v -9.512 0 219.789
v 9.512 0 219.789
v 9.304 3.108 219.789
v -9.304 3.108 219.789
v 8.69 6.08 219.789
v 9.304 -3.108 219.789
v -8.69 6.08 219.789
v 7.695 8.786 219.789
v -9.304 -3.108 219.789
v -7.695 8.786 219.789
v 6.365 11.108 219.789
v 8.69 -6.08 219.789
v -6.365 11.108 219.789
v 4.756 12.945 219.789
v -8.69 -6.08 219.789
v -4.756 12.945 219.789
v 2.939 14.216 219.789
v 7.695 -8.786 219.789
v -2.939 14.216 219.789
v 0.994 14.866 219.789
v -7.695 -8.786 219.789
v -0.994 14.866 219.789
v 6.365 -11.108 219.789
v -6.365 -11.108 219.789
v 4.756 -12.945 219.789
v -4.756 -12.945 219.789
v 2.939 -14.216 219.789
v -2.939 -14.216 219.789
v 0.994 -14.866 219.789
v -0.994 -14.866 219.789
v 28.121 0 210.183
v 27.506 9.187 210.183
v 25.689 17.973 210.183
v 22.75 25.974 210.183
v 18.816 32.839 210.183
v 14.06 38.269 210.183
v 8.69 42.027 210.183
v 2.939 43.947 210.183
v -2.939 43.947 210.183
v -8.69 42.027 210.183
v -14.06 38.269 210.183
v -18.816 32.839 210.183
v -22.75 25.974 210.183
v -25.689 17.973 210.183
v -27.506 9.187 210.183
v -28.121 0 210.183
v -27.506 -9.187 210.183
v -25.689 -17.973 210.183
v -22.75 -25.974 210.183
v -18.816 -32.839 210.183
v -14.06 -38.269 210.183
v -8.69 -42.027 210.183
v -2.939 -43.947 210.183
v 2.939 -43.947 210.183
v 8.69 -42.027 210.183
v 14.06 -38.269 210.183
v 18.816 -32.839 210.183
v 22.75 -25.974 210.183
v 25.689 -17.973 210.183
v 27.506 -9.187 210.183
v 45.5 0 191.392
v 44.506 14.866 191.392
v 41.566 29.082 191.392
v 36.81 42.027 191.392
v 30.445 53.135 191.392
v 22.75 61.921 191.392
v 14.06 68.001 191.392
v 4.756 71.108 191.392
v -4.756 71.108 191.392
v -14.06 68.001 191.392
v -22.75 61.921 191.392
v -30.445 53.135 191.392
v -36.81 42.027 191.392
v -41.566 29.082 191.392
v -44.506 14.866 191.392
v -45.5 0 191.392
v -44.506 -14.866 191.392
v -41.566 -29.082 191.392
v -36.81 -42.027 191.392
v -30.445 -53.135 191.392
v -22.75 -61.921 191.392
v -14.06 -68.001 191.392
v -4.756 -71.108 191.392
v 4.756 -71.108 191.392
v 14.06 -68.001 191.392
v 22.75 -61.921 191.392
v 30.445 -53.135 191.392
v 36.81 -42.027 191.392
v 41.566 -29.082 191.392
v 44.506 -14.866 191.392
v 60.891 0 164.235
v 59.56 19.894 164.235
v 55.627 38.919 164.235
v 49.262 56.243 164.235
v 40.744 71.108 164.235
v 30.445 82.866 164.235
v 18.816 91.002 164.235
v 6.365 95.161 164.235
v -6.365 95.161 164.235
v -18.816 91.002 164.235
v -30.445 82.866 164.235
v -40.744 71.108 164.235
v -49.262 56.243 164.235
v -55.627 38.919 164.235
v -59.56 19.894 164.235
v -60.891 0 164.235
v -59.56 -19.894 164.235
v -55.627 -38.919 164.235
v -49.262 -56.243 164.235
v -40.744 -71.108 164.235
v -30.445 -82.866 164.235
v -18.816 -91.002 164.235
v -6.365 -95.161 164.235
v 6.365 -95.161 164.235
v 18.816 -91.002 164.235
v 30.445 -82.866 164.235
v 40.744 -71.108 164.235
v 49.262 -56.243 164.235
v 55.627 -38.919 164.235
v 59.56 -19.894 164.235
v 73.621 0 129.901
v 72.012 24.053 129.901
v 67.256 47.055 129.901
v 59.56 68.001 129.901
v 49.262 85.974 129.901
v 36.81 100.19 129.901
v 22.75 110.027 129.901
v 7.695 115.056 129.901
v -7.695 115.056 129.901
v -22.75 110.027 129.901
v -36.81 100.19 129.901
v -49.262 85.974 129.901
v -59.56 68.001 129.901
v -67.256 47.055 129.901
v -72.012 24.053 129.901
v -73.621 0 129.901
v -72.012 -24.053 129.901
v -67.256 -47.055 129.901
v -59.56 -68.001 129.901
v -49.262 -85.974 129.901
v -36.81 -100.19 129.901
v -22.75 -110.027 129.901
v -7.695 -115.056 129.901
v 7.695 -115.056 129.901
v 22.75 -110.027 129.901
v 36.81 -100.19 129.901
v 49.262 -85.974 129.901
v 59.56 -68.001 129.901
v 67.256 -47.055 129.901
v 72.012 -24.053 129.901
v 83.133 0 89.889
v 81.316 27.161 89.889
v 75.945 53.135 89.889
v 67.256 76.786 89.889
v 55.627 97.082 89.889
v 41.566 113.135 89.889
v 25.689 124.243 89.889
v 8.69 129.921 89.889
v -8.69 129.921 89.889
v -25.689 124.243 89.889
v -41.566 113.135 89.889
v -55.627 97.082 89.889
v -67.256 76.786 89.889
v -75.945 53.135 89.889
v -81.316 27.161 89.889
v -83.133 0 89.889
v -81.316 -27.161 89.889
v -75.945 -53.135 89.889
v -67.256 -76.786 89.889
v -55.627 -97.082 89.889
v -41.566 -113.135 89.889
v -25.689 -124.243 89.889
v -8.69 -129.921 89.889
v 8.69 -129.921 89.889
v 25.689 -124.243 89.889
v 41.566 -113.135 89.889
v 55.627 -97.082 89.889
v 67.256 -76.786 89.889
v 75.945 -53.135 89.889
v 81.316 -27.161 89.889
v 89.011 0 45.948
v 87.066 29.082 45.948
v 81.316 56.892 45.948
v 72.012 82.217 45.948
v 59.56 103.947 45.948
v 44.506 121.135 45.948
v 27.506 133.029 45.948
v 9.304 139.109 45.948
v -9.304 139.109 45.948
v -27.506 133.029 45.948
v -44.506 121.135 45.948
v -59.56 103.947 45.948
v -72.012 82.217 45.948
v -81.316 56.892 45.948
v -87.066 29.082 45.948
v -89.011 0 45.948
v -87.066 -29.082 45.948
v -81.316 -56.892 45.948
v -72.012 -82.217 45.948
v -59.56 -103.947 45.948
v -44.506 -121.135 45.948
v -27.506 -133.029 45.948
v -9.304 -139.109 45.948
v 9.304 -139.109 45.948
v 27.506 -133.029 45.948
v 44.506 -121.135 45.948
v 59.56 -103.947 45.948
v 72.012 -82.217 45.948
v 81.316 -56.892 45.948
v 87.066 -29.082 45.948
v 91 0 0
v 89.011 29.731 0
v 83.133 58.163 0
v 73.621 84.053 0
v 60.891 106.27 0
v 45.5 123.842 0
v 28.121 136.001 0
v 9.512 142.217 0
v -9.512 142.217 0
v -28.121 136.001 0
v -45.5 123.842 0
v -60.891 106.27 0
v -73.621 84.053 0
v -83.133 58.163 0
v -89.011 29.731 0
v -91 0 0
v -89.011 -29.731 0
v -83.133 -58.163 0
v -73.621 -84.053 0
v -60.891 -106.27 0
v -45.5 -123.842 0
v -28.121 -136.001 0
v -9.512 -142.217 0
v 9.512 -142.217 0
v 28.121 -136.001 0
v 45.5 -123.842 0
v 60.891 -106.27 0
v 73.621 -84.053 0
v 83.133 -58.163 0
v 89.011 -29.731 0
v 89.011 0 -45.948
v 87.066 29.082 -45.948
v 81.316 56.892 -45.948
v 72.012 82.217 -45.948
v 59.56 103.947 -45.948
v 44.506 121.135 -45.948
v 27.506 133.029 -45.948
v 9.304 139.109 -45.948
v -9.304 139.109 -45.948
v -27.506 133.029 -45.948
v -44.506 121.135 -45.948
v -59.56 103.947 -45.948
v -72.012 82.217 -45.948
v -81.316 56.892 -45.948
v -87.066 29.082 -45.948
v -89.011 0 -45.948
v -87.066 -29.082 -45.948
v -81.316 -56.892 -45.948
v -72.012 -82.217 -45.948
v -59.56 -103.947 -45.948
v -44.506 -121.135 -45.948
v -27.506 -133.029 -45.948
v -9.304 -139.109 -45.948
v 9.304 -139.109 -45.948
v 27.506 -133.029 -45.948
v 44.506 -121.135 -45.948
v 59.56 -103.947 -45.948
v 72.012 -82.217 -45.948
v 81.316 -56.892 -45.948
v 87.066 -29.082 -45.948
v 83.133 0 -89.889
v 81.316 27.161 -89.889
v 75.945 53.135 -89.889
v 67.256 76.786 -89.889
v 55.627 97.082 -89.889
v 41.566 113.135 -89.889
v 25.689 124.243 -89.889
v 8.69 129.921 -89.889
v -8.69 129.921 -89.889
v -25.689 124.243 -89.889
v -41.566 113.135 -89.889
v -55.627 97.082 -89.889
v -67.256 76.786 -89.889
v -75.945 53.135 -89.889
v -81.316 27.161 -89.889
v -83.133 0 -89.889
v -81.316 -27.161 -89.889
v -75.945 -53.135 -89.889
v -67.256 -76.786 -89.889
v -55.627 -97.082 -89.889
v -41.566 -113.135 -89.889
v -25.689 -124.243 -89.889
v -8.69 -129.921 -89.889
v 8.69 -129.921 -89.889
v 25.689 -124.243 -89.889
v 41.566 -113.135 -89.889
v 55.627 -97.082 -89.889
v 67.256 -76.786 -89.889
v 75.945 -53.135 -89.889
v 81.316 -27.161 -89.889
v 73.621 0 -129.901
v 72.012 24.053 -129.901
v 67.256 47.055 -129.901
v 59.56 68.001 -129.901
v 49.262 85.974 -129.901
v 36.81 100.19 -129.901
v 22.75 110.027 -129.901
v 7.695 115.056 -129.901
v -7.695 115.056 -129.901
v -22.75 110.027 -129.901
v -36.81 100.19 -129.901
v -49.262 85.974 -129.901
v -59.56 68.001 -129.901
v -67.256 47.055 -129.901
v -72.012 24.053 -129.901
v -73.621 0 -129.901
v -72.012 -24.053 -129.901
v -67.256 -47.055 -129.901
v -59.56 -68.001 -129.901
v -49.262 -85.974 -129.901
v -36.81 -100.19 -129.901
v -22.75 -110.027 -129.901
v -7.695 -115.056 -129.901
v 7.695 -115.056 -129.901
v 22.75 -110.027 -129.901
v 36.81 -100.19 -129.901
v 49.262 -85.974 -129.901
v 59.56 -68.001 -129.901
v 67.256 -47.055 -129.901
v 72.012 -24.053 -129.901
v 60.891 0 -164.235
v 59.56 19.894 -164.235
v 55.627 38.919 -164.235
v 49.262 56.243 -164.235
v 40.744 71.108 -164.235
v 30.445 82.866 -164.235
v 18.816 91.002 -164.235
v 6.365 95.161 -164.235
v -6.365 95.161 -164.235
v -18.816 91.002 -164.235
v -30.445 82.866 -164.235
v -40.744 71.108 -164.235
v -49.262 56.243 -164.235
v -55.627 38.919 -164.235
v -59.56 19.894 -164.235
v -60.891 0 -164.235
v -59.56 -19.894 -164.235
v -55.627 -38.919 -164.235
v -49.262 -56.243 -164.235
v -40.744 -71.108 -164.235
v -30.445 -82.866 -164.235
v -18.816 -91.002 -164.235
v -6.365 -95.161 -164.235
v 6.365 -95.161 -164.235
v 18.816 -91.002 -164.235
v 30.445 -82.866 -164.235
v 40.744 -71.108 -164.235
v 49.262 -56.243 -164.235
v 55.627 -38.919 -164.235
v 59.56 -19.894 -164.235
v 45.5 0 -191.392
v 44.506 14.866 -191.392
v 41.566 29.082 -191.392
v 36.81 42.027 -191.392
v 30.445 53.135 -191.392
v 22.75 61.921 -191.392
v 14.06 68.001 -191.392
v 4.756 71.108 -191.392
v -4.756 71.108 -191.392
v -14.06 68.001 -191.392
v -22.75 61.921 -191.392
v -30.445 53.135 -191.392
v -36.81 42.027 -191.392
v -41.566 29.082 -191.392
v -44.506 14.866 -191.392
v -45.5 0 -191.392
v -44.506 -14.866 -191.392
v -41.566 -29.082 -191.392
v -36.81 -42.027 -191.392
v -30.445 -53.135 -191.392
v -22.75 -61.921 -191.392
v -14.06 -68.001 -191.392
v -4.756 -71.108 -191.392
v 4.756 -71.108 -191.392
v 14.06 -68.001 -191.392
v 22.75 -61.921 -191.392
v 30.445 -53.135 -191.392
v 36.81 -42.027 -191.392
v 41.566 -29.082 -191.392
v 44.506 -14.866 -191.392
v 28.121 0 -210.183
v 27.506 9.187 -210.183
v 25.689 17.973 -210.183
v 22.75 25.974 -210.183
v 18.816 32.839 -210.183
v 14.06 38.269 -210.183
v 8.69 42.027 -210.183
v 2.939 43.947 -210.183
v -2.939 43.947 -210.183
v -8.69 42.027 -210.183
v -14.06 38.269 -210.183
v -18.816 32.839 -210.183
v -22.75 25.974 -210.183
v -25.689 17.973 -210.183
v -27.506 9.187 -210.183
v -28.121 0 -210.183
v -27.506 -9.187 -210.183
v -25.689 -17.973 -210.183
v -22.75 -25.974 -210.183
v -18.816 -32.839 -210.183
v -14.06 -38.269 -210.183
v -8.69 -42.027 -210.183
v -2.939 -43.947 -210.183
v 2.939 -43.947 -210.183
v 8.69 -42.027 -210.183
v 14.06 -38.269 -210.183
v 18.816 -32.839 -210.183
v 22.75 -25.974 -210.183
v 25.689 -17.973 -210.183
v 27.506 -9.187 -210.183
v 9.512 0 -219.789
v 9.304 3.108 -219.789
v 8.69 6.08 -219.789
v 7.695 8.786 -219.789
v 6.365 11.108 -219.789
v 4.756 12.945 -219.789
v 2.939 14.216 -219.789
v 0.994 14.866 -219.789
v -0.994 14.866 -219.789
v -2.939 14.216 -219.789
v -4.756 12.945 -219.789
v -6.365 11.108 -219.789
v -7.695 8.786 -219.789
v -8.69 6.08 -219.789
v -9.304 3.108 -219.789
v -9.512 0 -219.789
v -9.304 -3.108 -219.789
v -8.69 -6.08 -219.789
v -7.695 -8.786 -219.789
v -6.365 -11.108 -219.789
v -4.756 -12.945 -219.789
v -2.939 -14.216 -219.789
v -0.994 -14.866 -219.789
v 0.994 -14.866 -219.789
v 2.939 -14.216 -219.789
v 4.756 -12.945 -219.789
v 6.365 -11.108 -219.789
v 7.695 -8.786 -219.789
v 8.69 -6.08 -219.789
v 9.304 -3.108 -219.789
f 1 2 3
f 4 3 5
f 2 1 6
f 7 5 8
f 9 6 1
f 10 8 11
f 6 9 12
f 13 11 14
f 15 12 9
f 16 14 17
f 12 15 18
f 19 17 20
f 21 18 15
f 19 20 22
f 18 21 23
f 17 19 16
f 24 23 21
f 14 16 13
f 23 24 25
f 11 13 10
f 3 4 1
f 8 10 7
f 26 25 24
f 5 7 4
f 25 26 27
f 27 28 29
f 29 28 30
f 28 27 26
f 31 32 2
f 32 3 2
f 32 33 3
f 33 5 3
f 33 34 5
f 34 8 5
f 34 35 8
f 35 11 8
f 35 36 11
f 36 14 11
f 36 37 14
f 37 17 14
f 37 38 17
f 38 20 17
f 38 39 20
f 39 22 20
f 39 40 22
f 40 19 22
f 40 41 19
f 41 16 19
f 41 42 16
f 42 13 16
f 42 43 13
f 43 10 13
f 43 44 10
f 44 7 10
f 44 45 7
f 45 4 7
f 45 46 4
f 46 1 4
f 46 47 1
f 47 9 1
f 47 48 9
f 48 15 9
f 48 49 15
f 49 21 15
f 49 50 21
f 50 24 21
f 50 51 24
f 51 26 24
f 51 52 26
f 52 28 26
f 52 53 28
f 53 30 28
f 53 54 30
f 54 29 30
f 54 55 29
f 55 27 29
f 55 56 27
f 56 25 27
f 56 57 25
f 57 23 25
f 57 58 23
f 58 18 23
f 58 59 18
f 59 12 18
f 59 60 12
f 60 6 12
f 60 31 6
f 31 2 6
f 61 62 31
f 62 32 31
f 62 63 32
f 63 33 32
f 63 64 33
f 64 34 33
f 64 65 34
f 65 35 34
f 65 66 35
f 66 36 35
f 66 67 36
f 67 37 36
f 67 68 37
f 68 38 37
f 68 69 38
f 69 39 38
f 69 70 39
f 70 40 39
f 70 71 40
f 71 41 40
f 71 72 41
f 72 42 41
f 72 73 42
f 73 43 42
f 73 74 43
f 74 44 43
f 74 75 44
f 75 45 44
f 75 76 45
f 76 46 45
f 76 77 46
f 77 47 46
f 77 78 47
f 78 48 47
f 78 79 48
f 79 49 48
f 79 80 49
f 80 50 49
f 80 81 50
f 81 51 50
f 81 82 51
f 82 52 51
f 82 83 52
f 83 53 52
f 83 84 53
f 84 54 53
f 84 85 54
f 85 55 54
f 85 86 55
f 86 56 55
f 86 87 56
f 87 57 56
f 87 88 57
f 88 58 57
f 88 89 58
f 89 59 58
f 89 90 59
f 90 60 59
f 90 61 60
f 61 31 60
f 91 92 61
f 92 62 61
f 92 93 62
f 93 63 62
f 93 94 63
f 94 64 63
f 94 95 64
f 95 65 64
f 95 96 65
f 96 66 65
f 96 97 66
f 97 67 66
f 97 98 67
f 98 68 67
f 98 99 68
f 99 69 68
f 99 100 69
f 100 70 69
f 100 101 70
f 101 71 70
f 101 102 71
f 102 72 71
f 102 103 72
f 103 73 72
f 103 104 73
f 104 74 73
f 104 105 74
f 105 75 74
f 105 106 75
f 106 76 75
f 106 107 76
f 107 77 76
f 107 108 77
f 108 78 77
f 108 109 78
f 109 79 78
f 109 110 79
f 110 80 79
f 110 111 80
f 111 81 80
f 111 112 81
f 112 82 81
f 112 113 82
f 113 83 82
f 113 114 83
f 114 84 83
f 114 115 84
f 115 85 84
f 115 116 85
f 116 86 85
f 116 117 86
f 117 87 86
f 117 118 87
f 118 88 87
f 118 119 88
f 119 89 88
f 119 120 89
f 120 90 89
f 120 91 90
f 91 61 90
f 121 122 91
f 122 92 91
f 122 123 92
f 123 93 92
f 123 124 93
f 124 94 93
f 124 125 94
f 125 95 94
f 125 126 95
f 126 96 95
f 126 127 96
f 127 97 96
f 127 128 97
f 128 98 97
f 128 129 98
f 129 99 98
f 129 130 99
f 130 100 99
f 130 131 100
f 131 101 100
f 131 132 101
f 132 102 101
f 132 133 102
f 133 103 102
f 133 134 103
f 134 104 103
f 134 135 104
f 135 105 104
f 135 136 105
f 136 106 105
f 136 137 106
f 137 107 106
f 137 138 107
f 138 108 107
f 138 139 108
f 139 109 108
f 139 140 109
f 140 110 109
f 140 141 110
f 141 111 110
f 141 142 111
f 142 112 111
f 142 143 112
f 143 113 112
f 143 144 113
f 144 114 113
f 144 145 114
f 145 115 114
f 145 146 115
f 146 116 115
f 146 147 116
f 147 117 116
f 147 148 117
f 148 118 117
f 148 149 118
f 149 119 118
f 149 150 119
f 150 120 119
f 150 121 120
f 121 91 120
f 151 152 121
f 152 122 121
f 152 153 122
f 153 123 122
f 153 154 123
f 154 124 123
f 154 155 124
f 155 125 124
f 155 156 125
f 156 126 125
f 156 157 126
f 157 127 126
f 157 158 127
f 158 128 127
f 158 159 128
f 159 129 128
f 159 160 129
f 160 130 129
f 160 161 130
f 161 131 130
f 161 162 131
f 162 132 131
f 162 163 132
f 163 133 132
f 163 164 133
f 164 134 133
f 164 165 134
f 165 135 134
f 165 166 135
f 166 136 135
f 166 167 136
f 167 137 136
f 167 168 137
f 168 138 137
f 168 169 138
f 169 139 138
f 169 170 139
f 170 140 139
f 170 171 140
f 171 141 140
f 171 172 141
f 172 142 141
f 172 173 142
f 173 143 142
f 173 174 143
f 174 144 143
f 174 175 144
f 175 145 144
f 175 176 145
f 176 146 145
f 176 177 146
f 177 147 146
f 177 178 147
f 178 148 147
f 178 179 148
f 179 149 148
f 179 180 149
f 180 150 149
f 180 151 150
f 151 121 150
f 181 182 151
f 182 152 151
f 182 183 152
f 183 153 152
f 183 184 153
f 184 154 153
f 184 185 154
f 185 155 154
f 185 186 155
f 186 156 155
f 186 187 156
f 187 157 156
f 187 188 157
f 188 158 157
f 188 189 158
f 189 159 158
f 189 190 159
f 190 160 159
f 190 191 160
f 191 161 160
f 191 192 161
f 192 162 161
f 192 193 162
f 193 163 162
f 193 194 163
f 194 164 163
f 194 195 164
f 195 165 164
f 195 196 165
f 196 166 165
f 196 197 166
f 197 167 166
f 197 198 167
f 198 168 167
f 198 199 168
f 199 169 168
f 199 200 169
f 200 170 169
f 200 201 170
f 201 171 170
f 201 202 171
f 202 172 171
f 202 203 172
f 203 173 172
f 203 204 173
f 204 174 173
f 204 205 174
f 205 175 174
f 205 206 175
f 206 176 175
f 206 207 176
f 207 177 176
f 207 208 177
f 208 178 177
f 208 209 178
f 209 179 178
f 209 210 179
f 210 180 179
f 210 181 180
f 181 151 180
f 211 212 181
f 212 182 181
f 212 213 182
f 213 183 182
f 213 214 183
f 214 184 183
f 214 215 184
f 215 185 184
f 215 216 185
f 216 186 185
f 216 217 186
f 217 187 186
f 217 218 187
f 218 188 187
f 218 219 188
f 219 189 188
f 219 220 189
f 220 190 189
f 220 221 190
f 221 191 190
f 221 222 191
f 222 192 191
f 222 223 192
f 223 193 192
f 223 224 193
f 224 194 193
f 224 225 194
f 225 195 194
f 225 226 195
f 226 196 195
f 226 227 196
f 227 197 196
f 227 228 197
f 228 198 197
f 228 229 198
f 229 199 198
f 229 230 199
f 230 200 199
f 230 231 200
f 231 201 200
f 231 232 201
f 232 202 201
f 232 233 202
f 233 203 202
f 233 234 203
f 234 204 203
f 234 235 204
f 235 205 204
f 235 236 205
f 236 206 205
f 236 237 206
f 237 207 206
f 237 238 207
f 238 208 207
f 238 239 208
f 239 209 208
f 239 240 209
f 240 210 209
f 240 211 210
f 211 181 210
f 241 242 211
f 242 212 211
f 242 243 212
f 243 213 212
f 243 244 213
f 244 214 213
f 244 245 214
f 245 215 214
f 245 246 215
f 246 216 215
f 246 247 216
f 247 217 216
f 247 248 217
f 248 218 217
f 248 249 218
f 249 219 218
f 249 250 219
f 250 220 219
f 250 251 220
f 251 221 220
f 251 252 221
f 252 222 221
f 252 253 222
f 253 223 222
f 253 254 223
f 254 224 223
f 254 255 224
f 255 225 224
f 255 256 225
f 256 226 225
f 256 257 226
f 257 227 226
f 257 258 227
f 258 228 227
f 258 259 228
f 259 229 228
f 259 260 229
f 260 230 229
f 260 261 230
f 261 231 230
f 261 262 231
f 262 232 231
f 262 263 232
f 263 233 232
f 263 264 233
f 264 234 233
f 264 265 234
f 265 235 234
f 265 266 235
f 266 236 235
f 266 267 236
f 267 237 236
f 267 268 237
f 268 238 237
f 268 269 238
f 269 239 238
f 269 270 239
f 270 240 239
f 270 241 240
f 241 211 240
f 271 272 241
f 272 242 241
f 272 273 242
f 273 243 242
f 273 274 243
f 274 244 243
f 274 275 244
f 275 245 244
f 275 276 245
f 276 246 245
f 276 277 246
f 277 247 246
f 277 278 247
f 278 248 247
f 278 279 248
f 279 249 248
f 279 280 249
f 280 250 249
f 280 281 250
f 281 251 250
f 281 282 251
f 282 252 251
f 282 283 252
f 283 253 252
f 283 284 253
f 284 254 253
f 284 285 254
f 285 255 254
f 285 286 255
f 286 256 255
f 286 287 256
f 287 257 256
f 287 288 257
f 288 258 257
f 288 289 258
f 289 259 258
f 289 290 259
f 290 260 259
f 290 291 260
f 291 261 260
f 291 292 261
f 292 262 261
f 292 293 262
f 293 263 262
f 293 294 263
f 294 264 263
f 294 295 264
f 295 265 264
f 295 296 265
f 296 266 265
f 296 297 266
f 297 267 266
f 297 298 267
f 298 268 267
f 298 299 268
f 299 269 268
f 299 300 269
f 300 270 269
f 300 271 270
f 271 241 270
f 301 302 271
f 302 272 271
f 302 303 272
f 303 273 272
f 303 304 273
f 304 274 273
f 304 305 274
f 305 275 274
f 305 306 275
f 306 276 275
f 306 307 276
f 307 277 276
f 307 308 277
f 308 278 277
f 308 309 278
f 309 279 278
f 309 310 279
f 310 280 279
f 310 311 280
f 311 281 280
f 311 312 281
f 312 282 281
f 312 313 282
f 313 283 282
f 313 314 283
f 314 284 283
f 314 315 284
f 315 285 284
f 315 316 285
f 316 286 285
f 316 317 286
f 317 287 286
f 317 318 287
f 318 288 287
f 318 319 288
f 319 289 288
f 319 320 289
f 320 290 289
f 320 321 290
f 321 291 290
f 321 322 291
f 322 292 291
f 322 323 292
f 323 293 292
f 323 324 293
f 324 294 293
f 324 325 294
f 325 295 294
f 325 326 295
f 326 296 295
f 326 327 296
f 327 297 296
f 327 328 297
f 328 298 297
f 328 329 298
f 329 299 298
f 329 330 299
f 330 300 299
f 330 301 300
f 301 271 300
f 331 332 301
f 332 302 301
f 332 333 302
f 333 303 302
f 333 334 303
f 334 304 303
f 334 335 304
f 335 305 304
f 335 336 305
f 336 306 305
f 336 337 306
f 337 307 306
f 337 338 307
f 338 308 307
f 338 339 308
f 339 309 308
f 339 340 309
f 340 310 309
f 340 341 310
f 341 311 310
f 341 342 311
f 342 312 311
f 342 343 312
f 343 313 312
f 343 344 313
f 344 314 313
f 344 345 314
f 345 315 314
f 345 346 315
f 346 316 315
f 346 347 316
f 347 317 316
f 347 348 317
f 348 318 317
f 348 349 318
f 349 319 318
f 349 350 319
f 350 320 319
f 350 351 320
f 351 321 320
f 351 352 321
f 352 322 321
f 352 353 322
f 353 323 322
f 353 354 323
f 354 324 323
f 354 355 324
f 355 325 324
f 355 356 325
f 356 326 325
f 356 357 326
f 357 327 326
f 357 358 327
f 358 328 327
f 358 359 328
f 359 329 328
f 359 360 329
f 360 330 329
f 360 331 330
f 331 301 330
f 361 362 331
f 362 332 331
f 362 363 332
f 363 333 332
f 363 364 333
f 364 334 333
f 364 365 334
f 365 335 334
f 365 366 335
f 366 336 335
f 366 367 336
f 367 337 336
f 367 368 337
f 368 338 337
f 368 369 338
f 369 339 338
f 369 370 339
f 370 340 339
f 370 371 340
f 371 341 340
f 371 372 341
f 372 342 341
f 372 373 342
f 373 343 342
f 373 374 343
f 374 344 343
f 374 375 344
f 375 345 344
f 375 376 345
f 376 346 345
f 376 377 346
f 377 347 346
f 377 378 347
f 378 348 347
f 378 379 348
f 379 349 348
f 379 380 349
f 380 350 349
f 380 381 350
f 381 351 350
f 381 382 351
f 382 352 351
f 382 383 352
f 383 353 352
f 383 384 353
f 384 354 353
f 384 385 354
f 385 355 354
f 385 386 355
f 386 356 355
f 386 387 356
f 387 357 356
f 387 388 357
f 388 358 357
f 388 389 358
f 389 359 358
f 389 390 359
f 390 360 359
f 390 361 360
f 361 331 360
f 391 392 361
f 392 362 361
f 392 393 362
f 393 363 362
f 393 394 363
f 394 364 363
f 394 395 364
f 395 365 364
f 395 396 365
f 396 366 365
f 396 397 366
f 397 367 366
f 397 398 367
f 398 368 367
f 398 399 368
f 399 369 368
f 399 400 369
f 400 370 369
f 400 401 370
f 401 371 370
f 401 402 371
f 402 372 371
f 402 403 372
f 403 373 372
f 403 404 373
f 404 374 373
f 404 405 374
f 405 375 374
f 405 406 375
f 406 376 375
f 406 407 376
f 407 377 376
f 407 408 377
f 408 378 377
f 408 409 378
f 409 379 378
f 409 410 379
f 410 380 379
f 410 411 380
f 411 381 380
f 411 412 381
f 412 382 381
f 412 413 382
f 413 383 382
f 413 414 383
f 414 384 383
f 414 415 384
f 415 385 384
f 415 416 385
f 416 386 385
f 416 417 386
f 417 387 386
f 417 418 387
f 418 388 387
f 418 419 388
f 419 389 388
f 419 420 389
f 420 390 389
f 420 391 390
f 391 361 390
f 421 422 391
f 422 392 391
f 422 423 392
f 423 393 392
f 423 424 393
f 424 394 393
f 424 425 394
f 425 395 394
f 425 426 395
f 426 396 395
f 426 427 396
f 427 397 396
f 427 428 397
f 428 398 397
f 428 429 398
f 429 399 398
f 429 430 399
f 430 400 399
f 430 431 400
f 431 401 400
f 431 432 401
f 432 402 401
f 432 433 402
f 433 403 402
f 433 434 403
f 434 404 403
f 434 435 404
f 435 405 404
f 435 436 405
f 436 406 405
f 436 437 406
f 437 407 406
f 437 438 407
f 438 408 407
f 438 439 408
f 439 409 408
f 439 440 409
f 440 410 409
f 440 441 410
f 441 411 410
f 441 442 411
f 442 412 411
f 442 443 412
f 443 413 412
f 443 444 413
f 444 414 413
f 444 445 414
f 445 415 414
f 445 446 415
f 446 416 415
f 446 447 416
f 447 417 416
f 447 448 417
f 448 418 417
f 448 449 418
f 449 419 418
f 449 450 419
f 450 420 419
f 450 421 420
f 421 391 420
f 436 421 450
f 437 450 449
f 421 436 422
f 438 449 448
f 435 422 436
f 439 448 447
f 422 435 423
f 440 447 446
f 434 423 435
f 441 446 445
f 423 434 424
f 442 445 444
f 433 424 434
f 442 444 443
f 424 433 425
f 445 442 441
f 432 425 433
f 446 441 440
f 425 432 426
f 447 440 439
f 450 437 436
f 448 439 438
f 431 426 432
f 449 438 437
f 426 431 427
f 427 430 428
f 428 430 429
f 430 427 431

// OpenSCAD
// Generated by SolidPython 1.0.1 on 2020-07-29 00:46:47


scale(v = [7, 11, 17]) {
	sphere(r = 13);
}
/***********************************************
*********      SolidPython code:      **********
************************************************
 
# import packages: SolidPython
from solid import *
from solid.utils import *
from itertools import chain, combinations, permutations


class Resize:

    def __init__(self, scad_file):
        self.scad_file = scad_file
        #self.scad_file = import_scad(scad_file)
        # cone/cylinder param:
        self.r1 = 0
        self.r2 = 0
        self.h = 0
        # rectangular prism param:
        self.w = 0
        self.l = 0
        # ellipse param:
        self.r = 0

    # import OpenScad code (file name corresponds to shape)


    # classify shape + parameters
    def assign(self, param1, param2, param3):
        if self.scad_file == 'cone.scad':
            self.r1 = param1
            self.r2 = param2
            self.h = param3
        elif self.scad_file == 'cylinder.scad':
            self.r1 = param1
            self.r2 = param2
            self.h = param3
        elif self.scad_file == 'rectangularPrism.scad':
            self.h = param1
            self.l = param2
            self.w = param3
        else:
            self.r = param1
            self.h = param2

    # resize parameters
    def iterate(self):
        x = range(3, 20, 2)
        i = 1
        if self.scad_file == 'cone.scad':
            tempList = list(permutations(x, 2))
            for temp in tempList:
                param1 = temp[0]
                param2 = temp[1]
                filepath = 'produced_scad_files/' + 'cone' + str(param1) + '_' + str(param2) + '_' + '.scad'
                scad_render_to_file(cylinder(h=param1, r1=param2, r2=0), filepath)

        elif self.scad_file == 'cylinder.scad':
            tempList = list(permutations(x, 3))
            for temp in tempList:
                param1 = temp[0]
                param2 = temp[1]
                filepath = 'produced_scad_files/' + 'cylinder' + str(param1) + '_' + str(param2) + '_' + '.scad'
                scad_render_to_file(cylinder(h=param1, r1=param2, r2=param2), filepath)

        elif self.scad_file == 'rectangularPrism.scad':
            tempList = list(permutations(x, 3))
            for temp in tempList:
                param1 = temp[0]
                param2 = temp[1]
                param3 = temp[2]
                filepath = 'produced_scad_files/' + 'rectangularPrism' + str(param1) + '_' + str(param2) + '_' + str(
                    param3) + '.scad'
                scad_render_to_file(cube(size=(param1, param2, param3)), filepath)

        elif self.scad_file == 'ellipse.scad':
            tempList = list(permutations(x, 4))
            for temp in tempList:
                param1 = temp[0]
                param2 = temp[1]
                param3 = temp[2]
                param4 = temp[3]
                filepath = 'produced_scad_files/' + 'ellipse' + str(param1) + '_' + str(param2) + '_' + str(param3) + '_' + str(param4) + '.scad'
                scad_render_to_file(scale([param1, param2, param3])(sphere(r=param4)), filepath)

    def render_to_scadfile(self):
        scad_render_to_file(scad, 'example.scad') 
 
************************************************/
